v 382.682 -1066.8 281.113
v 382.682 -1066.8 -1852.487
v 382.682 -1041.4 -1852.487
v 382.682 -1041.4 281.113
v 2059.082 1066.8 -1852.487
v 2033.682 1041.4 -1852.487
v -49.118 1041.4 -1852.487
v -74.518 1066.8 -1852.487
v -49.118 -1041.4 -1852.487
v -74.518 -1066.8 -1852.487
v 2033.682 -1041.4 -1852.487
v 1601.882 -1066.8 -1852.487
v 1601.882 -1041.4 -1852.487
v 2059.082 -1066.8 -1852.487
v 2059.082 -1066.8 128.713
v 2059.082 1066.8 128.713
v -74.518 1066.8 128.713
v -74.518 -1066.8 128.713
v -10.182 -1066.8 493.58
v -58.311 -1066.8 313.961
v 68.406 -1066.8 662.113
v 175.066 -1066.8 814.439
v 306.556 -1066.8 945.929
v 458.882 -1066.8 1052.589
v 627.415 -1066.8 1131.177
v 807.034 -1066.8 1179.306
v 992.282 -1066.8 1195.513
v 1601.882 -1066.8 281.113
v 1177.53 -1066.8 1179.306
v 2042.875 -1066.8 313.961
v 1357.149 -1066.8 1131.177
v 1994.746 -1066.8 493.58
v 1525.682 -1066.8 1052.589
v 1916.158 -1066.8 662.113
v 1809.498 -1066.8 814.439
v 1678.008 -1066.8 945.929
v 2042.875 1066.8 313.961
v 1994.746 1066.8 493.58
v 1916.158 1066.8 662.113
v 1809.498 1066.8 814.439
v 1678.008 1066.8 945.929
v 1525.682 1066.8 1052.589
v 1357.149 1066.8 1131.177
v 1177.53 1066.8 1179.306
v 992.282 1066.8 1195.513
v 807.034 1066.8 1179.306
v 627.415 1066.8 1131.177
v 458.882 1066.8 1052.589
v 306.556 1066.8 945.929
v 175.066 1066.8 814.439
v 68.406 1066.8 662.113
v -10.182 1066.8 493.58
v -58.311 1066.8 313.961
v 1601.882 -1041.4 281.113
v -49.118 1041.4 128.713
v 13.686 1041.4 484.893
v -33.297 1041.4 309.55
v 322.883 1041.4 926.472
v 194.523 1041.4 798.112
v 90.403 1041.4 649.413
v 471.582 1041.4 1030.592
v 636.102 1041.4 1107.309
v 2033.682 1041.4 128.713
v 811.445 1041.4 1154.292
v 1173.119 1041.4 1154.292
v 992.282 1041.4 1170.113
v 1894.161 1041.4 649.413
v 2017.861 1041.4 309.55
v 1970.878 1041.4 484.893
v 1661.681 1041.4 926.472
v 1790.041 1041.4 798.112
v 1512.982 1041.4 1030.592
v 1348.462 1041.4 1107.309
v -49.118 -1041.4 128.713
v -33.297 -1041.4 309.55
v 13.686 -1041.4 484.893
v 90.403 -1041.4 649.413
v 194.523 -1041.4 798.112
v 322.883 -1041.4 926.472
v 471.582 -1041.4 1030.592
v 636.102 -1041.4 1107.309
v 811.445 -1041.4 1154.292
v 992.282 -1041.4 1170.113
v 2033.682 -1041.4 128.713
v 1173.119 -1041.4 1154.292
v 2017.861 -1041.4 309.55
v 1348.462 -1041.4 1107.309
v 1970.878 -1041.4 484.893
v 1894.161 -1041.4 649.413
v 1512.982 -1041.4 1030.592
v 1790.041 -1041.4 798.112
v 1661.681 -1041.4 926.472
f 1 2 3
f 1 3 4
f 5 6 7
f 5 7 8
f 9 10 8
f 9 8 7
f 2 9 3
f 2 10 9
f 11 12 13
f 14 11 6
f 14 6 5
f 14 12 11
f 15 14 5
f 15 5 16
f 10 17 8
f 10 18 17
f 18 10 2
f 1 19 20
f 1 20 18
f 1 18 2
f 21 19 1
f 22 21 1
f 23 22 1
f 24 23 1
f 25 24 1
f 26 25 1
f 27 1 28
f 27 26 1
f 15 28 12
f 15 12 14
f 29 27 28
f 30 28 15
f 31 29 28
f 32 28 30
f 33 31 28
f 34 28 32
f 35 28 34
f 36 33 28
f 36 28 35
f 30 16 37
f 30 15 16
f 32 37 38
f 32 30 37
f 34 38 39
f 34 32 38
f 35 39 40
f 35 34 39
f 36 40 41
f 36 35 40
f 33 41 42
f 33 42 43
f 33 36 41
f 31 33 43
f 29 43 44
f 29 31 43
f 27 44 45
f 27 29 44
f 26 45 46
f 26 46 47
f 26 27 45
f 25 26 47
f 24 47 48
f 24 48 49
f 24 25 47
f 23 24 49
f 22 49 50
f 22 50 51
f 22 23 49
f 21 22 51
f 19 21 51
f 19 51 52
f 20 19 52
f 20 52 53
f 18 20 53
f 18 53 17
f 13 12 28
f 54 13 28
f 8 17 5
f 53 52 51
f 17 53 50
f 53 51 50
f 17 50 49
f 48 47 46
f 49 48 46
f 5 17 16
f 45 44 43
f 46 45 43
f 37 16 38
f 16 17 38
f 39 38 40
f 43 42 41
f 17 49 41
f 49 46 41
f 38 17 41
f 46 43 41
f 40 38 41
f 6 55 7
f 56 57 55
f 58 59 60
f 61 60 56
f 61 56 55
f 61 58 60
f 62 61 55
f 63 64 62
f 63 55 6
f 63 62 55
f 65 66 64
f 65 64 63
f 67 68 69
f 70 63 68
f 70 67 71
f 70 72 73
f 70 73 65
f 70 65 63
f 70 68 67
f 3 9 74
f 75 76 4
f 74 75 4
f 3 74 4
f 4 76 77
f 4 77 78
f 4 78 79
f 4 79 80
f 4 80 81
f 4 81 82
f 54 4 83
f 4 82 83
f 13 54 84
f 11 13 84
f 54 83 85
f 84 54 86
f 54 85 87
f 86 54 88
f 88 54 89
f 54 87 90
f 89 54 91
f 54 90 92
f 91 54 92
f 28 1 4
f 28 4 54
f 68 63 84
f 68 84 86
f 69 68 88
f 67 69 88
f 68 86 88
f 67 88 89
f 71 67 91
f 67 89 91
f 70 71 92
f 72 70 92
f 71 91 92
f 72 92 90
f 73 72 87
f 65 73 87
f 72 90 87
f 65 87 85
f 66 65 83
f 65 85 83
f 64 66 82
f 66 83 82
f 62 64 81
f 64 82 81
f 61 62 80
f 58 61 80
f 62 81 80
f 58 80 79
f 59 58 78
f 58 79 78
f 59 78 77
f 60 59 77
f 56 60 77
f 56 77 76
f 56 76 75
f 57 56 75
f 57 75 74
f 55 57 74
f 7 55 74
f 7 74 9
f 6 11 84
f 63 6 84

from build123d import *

# Parameters (mm, degrees)
F1_DEPTH = 1066.8
F2_W     = 1219.2
F2_H     = 2133.6
F3_DEPTH = 2108.2
F5_DEPTH = 1041.4


with BuildPart() as f1:
    # F0 (on Front) → F1 (new body, symmetric)
    with BuildSketch(Plane.XZ):
        with BuildLine():
            Line((-74.517928, 128.713136), (-74.517928, -1852.486864))
            Line((-74.517928, -1852.486864), (2059.082072, -1852.486864))
            Line((2059.082072, -1852.486864), (2059.082072, 128.713136))
            ThreePointArc((2059.082072, 128.713136), (992.282072, 1195.513136), (-74.517928, 128.713136))
        make_face()
    extrude(amount=F1_DEPTH, both=True)

    # F2 (on face) → F3 (cut)
    with BuildSketch(Plane.XZ.offset(1066.8)):
        with Locations((992.282072, -785.686864)):
            Rectangle(F2_W, F2_H)
    extrude(amount=-F3_DEPTH, mode=Mode.SUBTRACT)

    # F4 (on Front) → F5 (cut, symmetric)
    with BuildSketch(Plane.XZ):
        with BuildLine():
            Line((-49.117928, 128.713136), (-49.117928, -1852.486864))
            Line((-49.117928, -1852.486864), (2033.682072, -1852.486864))
            Line((2033.682072, -1852.486864), (2033.682072, 128.713136))
            ThreePointArc((2033.682072, 128.713136), (992.282072, 1170.113136), (-49.117928, 128.713136))
        make_face()
    extrude(amount=F5_DEPTH, both=True, mode=Mode.SUBTRACT)


solid = f1.part
